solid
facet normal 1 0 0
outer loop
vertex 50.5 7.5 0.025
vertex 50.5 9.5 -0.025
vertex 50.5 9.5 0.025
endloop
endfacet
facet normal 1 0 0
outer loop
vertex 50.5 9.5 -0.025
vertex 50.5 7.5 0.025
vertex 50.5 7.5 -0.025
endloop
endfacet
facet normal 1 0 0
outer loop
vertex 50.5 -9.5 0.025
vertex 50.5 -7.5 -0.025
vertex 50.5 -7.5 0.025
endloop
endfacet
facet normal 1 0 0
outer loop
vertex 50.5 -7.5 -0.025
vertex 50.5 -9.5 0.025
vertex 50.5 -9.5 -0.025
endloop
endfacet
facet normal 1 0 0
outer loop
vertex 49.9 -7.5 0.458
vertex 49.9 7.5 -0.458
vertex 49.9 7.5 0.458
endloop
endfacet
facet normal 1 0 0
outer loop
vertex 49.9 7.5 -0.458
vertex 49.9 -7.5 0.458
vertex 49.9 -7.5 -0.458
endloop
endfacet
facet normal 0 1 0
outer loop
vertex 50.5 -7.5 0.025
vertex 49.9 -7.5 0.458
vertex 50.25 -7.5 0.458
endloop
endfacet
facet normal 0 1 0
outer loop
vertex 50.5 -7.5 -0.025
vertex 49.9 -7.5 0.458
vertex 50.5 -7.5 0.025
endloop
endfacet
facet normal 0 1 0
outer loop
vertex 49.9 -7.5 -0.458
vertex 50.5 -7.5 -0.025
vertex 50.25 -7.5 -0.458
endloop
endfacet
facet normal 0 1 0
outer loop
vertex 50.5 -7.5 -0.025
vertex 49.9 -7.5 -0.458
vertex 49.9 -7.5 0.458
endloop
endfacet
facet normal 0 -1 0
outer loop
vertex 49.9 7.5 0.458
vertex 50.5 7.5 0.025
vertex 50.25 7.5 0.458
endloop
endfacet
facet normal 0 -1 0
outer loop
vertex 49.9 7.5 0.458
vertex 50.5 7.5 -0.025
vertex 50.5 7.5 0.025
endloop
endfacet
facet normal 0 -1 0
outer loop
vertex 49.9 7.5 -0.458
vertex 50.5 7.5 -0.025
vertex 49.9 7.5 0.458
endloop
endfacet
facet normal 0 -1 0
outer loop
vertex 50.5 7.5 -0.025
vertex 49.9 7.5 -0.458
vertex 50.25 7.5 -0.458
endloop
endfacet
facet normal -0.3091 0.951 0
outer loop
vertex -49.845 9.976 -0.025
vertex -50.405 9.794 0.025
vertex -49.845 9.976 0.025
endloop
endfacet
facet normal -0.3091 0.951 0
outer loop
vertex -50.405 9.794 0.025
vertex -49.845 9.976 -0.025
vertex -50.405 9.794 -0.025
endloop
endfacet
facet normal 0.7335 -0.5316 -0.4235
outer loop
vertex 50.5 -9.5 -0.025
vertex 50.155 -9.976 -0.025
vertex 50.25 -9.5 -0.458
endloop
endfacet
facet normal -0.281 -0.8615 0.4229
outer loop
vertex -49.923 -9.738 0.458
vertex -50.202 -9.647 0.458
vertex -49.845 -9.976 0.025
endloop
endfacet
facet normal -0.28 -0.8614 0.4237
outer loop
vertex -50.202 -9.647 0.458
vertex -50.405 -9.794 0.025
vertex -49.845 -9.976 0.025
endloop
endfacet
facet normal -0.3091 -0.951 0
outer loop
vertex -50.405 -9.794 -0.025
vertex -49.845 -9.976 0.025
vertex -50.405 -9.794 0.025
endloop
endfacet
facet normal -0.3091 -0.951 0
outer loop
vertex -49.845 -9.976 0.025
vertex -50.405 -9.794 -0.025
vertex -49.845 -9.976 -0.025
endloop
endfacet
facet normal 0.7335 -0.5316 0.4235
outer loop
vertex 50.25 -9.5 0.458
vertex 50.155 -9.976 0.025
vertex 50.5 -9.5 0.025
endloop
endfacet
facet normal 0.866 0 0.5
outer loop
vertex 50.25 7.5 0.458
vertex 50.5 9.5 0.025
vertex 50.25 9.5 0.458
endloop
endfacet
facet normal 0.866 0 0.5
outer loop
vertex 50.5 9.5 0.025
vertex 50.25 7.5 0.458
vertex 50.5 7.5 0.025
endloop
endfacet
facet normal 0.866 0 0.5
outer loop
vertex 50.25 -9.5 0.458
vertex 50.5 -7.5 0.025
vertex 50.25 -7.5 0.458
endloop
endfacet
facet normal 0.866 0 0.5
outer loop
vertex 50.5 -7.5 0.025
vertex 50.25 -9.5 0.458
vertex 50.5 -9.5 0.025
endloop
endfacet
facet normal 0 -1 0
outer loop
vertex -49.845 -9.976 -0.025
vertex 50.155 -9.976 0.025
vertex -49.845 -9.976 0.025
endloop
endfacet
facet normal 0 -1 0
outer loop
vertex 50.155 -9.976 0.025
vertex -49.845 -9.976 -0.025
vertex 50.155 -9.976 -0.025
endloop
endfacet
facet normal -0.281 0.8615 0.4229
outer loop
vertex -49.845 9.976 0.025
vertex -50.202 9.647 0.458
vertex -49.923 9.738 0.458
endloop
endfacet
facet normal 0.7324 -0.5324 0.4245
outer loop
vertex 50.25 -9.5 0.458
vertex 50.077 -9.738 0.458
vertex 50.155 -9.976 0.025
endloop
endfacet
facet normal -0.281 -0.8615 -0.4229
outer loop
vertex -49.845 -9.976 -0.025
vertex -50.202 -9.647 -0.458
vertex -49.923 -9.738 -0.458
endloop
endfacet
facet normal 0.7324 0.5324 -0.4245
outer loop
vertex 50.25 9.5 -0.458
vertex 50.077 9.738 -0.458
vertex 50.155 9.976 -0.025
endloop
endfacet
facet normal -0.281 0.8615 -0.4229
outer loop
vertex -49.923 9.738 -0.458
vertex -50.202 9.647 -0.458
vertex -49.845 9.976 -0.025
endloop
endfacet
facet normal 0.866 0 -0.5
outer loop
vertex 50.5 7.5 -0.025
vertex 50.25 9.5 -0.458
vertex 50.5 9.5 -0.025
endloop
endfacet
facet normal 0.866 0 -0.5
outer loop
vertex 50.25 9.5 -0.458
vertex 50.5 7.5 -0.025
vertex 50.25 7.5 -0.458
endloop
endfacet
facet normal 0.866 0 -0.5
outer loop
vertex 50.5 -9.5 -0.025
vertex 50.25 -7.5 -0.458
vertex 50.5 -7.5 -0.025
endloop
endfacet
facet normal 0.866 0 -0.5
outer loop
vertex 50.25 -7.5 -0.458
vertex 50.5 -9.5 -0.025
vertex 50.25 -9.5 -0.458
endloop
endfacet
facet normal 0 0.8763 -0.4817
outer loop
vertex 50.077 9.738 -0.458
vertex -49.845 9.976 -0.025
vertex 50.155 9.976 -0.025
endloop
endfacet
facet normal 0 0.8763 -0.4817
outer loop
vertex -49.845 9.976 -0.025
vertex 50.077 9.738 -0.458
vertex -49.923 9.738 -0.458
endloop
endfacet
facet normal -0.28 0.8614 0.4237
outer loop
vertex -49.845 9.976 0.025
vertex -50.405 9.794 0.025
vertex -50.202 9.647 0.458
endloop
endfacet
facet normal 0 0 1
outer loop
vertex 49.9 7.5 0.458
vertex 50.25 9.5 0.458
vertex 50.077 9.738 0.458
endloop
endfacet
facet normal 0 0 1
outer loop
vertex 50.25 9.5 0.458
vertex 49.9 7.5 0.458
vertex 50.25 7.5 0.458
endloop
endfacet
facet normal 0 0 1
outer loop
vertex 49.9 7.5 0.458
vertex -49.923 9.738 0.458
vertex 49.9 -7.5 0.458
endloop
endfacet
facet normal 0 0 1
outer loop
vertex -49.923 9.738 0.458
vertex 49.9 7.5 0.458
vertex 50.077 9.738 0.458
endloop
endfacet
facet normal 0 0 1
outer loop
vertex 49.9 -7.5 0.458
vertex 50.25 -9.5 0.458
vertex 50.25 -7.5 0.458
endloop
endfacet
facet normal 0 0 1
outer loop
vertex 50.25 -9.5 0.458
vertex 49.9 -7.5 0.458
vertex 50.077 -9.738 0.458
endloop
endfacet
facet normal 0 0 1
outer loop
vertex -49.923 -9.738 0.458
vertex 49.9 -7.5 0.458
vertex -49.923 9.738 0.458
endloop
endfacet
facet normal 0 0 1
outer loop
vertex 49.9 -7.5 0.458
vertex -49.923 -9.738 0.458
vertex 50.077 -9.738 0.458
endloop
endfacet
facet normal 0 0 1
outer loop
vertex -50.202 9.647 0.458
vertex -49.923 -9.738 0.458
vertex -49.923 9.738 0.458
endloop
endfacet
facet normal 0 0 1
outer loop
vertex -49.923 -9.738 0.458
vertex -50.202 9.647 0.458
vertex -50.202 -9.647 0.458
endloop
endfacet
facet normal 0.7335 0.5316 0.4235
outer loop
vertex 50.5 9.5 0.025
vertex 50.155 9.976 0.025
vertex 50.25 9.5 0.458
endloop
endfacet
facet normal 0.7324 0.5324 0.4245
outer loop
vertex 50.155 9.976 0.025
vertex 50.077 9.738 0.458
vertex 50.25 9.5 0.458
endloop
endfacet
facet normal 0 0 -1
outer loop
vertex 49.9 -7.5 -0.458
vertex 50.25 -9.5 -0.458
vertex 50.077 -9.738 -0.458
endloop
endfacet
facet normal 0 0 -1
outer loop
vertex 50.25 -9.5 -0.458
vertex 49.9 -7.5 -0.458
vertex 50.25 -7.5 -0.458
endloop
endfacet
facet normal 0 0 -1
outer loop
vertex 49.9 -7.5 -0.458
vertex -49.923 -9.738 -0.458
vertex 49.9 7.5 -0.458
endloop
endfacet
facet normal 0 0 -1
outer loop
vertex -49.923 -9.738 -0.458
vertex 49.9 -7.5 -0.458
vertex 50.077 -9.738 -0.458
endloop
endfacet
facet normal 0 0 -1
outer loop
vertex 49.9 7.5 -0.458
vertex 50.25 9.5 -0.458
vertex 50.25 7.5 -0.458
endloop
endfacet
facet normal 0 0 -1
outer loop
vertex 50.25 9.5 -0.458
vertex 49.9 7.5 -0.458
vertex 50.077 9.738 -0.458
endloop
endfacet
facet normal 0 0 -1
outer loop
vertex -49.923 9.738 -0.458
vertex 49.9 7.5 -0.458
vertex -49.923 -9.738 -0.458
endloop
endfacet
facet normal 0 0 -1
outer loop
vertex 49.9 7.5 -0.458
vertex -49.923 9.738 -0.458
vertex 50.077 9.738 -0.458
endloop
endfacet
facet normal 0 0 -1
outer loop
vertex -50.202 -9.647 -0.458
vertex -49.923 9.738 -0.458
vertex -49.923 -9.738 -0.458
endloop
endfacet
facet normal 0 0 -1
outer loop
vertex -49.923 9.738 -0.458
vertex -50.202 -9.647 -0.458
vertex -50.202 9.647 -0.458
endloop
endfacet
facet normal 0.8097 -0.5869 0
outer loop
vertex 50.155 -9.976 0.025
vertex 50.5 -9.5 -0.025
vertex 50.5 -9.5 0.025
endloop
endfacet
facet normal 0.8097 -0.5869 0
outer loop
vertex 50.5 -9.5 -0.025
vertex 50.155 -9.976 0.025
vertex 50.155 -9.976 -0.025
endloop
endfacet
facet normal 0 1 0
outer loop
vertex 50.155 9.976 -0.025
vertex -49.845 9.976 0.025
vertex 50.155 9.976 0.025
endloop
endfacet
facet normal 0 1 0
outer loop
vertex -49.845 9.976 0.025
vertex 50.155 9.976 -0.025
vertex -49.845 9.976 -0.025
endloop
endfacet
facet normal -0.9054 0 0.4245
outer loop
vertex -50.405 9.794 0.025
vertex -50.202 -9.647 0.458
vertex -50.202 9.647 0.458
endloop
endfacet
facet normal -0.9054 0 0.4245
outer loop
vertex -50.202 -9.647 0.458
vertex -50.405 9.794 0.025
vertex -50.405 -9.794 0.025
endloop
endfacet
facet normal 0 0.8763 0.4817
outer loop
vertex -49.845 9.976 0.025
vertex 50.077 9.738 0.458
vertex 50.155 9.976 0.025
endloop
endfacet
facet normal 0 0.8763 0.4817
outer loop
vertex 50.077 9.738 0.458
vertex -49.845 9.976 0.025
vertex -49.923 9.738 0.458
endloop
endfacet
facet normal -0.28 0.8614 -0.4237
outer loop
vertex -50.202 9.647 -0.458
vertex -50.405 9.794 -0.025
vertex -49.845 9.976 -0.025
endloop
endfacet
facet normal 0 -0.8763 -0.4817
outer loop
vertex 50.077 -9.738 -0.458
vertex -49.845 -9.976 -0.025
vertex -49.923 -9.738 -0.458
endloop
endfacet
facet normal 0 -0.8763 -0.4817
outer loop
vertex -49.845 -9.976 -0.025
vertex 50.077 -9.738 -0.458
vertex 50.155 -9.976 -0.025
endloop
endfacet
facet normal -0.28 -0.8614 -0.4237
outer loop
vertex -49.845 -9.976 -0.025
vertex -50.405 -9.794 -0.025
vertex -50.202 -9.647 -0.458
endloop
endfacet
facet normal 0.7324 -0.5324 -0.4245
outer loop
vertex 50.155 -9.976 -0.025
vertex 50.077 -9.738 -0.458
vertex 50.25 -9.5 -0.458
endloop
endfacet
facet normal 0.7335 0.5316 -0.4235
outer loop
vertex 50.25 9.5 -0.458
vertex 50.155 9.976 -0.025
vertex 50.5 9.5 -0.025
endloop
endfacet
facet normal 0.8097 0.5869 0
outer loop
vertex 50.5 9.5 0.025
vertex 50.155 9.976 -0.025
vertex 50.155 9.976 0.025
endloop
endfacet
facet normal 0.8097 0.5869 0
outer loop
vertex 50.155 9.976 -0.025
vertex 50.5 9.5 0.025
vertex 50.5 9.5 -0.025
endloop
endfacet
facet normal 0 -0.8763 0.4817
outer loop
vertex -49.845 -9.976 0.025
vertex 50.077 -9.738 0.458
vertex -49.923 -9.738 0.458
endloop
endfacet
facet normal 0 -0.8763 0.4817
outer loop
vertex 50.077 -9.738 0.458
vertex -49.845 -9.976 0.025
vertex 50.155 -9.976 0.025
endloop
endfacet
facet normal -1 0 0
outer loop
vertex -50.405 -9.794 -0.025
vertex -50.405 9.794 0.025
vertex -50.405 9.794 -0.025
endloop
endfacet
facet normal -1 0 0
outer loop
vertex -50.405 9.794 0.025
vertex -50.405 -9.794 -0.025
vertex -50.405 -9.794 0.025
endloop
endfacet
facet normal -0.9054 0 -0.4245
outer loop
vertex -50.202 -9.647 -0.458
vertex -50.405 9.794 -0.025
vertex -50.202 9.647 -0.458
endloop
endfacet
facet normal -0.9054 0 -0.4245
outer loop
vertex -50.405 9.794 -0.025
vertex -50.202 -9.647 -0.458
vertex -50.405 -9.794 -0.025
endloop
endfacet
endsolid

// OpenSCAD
// Parameters
tape_L = 100; //[50:200:1]
tape_W = 19; //[10:40:1]
tape_T = 0.05; //[0.02:0.2:0.01]
edge_R = 0.5; //[0.2:1.5:0.1]
overlap = 0.5; //[0.2:2:0.1]
torn_depth = 0.6; //[0.2:2:0.1]
torn_notch_W = 3; //[1:8:0.5]
torn_count = 5; //[2:12:1]

// Base shapes
module tape_sheet() {
  cube([tape_L, tape_W, tape_T], center=true);
}

module tape_edge_rounding() {
  sphere(r=edge_R, center=true);
}

module torn_notch(position_y) {
  translate([tape_L/2 - torn_depth/2 + overlap, position_y, 0])
    cube([torn_depth, torn_notch_W, tape_T + 2*overlap], center=true);
}

// Operations
module semi_transparent_material_hint() {
  minkowski() {
    tape_sheet();
    tape_edge_rounding();
  }
}

module torn_edge_detail() {
  difference() {
    semi_transparent_material_hint();
    for (i = [-2, -1, 0, 1, 2]) {
      torn_notch(i * torn_notch_W);
    }
  }
}

// Final output
color([0.85, 0.85, 0.8]) // Off-white color for adhesive tape
torn_edge_detail();
